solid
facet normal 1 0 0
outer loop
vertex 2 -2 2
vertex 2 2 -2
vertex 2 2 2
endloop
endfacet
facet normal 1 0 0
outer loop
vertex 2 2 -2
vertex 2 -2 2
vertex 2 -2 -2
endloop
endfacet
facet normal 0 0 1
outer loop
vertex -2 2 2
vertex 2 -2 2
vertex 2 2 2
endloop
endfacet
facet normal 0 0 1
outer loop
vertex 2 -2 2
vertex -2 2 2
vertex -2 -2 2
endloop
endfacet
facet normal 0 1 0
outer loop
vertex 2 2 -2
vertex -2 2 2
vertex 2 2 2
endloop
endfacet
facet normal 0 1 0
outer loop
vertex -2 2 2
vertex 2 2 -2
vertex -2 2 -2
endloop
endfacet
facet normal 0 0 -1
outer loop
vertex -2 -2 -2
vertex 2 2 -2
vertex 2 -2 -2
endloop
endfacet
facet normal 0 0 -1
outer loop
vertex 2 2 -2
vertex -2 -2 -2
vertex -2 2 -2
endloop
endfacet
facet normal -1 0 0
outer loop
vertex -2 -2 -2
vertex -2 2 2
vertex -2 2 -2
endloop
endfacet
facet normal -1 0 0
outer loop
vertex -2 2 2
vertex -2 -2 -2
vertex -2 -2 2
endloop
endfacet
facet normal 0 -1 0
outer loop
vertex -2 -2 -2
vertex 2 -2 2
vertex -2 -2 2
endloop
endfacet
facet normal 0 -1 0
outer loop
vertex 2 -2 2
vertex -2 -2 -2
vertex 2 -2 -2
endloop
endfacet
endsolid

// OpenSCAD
cube();
cube(2);
cube([1, 2, 3], center = true);
cube(size = [1.5, 2, 1/3]);
cube(center = true, size = 4);
